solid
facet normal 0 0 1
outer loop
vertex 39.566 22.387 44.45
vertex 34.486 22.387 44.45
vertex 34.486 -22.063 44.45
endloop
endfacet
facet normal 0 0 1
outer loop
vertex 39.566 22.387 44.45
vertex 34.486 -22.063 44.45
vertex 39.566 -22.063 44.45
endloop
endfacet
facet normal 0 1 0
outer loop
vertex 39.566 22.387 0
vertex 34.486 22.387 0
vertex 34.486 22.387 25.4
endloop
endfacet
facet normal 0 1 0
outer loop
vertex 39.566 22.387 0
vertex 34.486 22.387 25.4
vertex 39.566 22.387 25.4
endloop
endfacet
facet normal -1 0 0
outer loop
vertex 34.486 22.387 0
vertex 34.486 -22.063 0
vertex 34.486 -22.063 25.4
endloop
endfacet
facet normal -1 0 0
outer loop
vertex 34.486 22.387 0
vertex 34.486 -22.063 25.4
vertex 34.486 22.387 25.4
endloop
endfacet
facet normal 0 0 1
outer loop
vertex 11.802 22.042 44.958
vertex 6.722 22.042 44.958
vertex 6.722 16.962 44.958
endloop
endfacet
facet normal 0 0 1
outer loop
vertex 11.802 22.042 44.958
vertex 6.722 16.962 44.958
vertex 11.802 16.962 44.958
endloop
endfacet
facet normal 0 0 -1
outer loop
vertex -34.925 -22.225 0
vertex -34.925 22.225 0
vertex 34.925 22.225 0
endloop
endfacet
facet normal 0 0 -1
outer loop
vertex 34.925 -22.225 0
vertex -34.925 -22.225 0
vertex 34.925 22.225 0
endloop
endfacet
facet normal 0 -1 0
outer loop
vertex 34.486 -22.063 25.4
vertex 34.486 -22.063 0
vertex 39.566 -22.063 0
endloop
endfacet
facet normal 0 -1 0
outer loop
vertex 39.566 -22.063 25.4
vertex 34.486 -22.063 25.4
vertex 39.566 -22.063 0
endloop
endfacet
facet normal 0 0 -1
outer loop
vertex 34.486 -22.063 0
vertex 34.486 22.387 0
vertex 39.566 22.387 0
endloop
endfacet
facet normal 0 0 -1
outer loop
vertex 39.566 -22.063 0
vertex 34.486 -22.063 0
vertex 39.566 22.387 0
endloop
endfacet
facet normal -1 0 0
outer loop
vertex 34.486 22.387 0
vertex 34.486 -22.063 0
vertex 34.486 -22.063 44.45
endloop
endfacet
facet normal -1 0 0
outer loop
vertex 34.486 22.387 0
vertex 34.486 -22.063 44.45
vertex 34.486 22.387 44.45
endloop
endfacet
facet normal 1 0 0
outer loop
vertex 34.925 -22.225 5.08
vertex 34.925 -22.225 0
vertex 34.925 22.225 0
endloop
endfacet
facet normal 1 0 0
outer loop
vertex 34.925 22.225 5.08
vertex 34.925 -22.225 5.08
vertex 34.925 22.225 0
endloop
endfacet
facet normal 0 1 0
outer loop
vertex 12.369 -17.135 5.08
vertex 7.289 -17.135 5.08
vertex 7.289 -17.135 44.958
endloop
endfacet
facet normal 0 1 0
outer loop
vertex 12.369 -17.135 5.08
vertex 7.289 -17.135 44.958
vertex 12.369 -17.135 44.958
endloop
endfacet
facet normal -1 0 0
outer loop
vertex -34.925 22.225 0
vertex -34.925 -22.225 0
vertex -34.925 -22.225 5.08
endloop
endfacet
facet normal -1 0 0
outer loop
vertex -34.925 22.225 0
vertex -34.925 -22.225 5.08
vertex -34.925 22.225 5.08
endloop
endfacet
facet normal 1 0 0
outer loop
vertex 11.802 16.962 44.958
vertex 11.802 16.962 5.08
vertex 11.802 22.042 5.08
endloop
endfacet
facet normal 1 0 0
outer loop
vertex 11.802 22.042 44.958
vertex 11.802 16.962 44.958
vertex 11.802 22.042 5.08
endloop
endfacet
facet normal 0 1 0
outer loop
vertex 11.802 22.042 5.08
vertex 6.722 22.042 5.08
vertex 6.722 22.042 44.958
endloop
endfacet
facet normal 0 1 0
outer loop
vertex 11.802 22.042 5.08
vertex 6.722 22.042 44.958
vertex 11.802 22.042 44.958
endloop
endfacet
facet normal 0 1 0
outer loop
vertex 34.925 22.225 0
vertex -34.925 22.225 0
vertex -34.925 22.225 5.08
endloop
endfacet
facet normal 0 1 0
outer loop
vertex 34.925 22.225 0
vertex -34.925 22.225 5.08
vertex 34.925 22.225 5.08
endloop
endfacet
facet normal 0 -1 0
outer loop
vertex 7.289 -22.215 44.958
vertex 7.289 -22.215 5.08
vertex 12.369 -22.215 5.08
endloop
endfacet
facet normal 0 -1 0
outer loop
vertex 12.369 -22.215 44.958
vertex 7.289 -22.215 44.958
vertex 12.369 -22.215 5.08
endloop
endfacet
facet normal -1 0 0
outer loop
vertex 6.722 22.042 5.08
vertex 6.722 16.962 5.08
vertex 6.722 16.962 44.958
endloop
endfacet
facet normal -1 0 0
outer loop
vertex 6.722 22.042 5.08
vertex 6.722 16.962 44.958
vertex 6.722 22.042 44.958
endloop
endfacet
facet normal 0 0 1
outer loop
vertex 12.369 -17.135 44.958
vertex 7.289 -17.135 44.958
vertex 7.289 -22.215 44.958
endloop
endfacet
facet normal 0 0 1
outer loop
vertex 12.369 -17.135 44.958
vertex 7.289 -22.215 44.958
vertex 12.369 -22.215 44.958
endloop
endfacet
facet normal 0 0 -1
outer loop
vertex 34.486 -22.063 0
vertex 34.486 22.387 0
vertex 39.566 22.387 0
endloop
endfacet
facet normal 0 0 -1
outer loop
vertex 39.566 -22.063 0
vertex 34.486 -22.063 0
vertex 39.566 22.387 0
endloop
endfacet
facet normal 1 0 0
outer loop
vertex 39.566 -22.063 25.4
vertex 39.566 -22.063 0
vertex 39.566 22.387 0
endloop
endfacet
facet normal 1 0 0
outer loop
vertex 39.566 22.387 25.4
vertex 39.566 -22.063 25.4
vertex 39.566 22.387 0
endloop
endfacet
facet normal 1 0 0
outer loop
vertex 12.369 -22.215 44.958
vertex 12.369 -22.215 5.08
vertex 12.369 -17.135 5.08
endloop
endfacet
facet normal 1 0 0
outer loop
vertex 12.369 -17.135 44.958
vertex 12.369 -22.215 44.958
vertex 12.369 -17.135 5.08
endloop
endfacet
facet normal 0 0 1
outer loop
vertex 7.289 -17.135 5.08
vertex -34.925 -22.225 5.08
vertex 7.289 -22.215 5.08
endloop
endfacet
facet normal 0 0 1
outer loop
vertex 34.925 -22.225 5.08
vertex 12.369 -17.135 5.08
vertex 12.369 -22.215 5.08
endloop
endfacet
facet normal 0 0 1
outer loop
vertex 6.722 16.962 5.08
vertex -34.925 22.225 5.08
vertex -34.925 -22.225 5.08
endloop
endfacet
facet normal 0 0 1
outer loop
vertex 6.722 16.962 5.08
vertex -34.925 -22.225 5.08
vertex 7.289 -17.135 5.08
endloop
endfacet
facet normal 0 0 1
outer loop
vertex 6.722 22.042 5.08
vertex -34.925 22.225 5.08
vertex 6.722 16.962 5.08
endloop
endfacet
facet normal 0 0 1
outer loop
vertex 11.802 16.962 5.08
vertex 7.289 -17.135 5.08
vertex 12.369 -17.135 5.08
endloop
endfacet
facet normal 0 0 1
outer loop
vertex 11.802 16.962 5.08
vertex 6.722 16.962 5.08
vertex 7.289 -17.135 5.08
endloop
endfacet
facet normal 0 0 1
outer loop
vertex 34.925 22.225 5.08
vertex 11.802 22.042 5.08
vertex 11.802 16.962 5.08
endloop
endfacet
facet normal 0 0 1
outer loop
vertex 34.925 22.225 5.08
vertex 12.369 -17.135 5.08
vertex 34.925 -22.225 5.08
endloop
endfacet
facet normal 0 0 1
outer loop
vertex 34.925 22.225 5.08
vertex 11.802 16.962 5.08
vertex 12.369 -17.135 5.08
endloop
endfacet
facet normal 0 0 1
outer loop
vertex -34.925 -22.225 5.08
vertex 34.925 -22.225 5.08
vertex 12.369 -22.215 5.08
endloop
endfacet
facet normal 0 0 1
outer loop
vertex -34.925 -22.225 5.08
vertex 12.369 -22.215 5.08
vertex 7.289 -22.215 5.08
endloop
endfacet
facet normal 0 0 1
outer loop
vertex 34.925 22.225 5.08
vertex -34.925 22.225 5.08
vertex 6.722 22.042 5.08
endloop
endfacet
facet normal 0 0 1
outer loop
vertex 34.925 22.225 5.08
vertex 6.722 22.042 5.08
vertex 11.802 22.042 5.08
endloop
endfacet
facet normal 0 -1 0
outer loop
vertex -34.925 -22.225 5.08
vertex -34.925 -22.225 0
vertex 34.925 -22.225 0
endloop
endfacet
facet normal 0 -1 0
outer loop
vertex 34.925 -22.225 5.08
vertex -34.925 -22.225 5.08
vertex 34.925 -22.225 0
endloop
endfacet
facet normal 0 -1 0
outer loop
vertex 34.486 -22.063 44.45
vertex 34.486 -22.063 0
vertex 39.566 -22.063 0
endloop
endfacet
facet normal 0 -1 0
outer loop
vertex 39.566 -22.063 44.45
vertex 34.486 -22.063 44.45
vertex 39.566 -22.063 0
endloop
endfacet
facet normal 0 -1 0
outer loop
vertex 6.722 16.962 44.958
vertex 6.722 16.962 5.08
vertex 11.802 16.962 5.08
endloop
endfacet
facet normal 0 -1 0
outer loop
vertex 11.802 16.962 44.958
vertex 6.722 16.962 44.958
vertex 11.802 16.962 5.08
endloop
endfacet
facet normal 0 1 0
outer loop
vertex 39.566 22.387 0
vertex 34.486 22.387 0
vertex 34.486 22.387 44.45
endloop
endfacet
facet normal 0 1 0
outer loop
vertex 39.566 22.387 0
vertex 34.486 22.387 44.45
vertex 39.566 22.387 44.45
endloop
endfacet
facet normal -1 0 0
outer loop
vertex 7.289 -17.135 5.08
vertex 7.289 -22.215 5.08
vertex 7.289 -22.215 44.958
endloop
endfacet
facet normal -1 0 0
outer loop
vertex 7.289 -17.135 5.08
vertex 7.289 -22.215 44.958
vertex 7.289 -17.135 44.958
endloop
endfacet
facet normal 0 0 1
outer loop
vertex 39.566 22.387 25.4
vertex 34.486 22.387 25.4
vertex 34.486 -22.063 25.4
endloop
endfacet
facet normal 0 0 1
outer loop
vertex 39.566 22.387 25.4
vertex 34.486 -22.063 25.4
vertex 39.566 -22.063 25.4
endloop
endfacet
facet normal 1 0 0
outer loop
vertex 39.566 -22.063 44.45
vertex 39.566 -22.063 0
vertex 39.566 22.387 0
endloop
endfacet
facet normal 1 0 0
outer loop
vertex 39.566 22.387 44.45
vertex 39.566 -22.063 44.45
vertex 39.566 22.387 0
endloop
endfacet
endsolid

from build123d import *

# Parameters (mm, degrees)
F0_W     = 69.85
F0_H     = 44.45
F1_DEPTH = 5.08
F2_W     = 5.08
F2_H     = 44.45
F3_DEPTH = 44.45
F4_DEPTH = 25.4
F5_W     = 5.08
F5_H     = 5.08
F6_DEPTH = 44.958
F7_W     = 5.08
F7_H     = 5.08
F8_DEPTH = 44.958


with BuildPart() as f1:
    # F0 (on Top) → F1 (new body)
    with BuildSketch(Plane.XY):
        Rectangle(F0_W, F0_H)
    extrude(amount=F1_DEPTH)

    # F5 (on Top) → F6 (join)
    with BuildSketch(Plane.XY):
        with Locations((9.829413, -19.675359)):
            Rectangle(F5_W, F5_H)
    extrude(amount=F6_DEPTH)

    # F7 (on Top) + F5 (on Top) → F8 (join)
    with BuildSketch(Plane.XY):
        with Locations((9.261909, 19.501801)):
            Rectangle(F7_W, F7_H)
    with BuildSketch(Plane.XY):
        with Locations((9.829413, -19.675359)):
            Rectangle(F5_W, F5_H)
    extrude(amount=F8_DEPTH)


with BuildPart() as f3:
    # F2 (on Top) → F3 (new body)
    with BuildSketch(Plane.XY):
        with Locations((37.026247, 0.162242)):
            Rectangle(F2_W, F2_H)
    extrude(amount=F3_DEPTH)


with BuildPart() as f4:
    # F2 (on Top) → F4 (new body)
    with BuildSketch(Plane.XY):
        with Locations((37.026247, 0.162242)):
            Rectangle(F2_W, F2_H)
    extrude(amount=F4_DEPTH)


solid = Compound([f1.part, f3.part, f4.part])
